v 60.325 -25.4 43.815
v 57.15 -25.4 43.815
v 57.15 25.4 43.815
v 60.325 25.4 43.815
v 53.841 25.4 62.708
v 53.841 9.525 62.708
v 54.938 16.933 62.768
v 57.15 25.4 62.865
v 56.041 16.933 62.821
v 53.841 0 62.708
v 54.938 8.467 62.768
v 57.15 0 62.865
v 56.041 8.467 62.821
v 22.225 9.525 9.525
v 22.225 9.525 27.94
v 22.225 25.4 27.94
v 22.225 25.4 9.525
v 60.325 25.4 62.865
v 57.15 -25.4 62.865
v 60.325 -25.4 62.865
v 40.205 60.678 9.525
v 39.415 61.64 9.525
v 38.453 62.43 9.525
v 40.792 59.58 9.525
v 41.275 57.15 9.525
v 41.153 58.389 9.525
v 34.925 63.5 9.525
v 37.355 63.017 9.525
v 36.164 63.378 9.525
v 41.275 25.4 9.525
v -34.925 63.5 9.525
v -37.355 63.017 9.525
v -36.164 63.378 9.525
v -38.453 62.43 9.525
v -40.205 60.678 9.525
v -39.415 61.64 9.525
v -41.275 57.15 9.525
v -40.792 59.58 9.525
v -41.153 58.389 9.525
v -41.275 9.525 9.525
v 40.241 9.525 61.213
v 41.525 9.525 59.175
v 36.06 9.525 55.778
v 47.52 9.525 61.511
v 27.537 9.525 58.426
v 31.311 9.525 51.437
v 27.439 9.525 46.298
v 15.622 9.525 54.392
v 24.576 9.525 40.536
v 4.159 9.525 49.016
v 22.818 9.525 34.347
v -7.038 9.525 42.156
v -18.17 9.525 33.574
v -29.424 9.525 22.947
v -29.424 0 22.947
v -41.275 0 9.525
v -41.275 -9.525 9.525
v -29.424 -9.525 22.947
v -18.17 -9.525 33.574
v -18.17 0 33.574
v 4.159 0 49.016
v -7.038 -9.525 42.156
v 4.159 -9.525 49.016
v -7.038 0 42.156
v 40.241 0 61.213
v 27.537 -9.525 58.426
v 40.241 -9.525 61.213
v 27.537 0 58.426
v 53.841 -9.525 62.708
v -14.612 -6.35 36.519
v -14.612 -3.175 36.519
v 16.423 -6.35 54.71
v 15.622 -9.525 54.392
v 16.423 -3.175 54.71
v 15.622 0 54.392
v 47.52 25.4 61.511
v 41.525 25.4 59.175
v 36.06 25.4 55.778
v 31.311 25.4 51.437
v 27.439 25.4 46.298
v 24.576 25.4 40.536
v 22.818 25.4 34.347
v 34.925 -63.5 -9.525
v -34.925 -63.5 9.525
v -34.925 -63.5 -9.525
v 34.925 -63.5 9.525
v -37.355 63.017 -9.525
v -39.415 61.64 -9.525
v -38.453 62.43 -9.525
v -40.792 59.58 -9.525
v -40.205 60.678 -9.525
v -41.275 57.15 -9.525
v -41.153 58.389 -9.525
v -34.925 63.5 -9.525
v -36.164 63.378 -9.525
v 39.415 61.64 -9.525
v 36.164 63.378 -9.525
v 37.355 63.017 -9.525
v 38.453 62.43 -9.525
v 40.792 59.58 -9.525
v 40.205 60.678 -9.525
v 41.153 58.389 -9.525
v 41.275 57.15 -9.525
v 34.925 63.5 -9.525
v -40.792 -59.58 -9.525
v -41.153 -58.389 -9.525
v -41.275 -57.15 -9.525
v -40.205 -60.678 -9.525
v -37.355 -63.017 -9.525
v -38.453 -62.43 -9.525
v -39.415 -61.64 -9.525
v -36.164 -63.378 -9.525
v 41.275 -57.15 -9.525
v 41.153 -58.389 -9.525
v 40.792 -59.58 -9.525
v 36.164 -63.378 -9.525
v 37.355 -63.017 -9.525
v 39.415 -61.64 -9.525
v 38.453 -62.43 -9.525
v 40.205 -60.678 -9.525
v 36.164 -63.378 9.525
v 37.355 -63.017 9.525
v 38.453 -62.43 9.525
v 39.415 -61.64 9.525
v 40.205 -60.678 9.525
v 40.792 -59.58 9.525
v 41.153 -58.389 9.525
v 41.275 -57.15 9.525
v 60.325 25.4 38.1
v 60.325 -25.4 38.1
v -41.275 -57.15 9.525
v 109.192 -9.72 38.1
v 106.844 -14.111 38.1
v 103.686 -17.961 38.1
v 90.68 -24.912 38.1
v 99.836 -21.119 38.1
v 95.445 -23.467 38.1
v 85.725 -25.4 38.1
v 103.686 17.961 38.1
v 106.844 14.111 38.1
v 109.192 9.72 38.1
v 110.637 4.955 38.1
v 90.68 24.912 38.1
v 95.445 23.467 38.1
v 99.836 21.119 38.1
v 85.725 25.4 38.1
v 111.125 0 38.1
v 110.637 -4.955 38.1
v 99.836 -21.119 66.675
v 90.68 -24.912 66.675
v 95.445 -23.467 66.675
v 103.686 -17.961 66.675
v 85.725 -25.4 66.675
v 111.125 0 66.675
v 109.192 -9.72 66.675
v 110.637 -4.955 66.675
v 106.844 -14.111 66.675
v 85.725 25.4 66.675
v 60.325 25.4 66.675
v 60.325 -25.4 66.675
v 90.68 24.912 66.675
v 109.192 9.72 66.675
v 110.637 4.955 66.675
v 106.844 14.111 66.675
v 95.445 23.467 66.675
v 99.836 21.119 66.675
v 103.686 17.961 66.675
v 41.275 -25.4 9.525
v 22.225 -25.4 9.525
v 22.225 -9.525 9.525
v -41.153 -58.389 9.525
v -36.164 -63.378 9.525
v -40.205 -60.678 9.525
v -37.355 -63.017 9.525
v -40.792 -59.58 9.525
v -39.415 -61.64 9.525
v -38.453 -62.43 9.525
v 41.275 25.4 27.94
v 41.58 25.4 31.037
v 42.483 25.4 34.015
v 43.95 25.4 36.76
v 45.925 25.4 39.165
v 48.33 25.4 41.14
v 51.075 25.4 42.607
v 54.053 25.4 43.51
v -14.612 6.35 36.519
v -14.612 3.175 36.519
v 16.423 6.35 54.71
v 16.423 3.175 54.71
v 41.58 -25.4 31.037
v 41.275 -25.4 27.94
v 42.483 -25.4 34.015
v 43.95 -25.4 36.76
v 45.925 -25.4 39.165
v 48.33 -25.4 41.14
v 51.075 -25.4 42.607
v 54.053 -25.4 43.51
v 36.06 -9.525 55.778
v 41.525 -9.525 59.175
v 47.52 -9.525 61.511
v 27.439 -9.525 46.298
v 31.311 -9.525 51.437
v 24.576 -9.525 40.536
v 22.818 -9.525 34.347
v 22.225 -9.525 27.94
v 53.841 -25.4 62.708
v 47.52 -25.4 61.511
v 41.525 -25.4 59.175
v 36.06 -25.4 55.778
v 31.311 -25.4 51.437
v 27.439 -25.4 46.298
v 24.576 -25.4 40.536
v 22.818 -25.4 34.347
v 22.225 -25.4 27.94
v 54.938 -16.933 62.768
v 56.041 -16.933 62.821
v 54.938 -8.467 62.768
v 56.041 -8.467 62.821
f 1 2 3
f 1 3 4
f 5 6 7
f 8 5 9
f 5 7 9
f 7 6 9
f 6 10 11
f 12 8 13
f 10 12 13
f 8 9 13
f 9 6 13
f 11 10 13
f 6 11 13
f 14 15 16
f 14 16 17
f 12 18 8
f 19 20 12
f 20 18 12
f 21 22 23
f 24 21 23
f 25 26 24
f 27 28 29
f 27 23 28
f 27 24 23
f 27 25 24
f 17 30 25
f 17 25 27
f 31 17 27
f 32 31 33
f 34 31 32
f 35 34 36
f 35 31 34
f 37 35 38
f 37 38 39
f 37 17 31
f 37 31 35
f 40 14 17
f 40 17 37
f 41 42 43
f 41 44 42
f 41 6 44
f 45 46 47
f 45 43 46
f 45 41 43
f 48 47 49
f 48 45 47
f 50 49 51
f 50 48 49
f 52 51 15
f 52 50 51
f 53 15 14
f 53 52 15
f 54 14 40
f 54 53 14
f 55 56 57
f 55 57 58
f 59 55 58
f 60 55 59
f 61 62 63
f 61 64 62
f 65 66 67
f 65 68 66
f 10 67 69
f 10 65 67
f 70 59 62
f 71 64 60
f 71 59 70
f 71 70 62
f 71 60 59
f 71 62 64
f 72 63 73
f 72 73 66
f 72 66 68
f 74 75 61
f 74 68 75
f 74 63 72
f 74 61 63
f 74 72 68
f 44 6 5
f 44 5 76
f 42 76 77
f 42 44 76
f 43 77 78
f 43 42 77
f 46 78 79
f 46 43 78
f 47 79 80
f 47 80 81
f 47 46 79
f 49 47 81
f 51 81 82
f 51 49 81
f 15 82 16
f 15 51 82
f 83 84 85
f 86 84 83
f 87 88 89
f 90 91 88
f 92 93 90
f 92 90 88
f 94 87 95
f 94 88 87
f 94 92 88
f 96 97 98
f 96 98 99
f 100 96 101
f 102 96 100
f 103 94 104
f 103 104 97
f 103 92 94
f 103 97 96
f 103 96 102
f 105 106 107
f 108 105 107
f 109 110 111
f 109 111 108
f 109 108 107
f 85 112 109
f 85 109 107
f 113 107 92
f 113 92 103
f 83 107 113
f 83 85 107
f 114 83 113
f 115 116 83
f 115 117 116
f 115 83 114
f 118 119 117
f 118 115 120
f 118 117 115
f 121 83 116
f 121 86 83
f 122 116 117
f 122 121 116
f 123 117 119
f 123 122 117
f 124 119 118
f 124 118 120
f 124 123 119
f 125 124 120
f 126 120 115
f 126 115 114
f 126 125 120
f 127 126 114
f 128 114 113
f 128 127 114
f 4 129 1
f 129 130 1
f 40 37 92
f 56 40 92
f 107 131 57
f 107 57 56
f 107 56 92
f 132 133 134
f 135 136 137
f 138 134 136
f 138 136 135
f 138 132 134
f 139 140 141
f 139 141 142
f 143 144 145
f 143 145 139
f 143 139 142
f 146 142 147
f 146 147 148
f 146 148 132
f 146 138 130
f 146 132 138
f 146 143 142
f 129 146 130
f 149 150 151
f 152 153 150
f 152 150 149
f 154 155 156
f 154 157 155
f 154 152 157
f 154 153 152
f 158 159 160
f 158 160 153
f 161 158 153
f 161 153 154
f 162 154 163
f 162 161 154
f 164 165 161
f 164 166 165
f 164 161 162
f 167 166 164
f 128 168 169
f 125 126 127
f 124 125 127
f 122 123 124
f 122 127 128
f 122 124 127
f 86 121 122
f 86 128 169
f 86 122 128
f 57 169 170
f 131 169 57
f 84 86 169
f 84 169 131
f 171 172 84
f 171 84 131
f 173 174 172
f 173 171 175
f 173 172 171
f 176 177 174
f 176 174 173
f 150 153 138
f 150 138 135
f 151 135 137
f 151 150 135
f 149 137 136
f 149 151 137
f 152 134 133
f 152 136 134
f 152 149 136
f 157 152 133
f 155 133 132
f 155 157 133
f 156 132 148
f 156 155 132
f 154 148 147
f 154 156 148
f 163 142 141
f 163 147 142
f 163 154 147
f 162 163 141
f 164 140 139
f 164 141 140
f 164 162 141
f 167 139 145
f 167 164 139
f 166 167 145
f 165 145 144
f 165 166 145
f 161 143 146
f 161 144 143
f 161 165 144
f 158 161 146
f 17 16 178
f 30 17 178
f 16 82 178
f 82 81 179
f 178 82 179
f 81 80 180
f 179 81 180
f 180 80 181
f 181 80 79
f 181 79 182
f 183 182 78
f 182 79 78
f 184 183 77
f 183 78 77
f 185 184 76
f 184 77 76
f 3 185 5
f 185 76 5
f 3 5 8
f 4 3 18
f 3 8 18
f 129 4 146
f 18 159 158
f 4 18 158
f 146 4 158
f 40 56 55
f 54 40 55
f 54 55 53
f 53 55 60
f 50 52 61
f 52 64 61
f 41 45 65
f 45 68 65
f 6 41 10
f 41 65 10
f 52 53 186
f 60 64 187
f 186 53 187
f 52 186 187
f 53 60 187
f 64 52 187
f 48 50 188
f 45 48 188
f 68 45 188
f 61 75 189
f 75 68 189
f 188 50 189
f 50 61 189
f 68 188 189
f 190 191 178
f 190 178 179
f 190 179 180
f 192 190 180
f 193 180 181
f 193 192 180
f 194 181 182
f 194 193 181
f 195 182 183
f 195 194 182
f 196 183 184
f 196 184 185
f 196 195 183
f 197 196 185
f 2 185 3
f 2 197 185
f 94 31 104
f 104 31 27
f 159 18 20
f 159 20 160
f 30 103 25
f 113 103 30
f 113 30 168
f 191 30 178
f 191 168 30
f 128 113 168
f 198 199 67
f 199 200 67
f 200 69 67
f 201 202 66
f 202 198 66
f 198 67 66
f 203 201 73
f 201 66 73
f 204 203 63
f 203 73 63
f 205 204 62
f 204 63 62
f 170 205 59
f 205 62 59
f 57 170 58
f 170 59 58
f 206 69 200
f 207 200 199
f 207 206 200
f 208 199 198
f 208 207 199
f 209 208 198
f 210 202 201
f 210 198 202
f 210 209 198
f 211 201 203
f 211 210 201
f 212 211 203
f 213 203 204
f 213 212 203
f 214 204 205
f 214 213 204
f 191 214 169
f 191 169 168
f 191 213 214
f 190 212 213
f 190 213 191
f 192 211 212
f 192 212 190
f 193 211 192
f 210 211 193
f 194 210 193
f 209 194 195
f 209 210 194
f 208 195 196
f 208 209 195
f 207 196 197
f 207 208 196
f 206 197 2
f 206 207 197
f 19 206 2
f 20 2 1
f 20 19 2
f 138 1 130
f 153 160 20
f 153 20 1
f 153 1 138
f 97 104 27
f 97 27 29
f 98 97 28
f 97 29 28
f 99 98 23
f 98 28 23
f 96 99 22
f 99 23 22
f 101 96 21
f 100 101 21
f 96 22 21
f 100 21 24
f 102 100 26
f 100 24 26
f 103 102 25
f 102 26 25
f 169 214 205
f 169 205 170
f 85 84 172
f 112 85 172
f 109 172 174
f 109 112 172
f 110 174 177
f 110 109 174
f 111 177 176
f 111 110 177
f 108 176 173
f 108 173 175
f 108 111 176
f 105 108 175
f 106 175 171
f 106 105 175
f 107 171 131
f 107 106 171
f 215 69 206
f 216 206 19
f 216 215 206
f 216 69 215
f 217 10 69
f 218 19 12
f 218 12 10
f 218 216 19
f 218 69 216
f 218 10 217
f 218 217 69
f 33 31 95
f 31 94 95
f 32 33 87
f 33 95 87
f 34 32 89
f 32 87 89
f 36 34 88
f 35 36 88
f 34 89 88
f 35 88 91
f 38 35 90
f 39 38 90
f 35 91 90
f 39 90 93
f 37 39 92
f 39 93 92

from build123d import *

# Parameters (mm, degrees)
F1_DEPTH = 63.5
F0_W     = 25.4
F0_H     = 5.715
F0_H_2   = 3.81
F0_H_3   = 19.05
F2_DEPTH = 25.4
F3_DEPTH = 9.525
F5_R     = 6.35


with BuildPart() as f1:
    # F0 (on Front) → F1 (new body, symmetric)
    with BuildSketch(Plane.XZ):
        Polygon((22.225, 9.525), (-41.275, 9.525), (-41.275, -9.525), (41.275, -9.525), (41.275, 9.525), align=None)
    extrude(amount=F1_DEPTH, both=True)

    # F0 (on Front) → F2 (join, symmetric)
    with BuildSketch(Plane.XZ):
        with BuildLine():
            Line((22.225, 27.94), (22.225, 9.525))
            Line((22.225, 9.525), (41.275, 9.525))
            Line((41.275, 9.525), (41.275, 27.94))
            ThreePointArc((41.275, 27.94), (45.9246798487, 39.1653201513), (57.15, 43.815))
            Line((57.15, 43.815), (60.325, 43.815))
            Line((60.325, 43.815), (60.325, 62.865))
            Line((60.325, 62.865), (57.15, 62.865))
            add(Edge.make_bspline(
                [(53.8414351699, 62.7079309676), (54.9353913903, 62.7725296007), (56.0381901925, 62.8249247758), (57.15, 62.865)],
                knots=[109.0590899765, 109.0590899765, 109.0590899765, 109.0590899765, 111.9492573669, 111.9492573669, 111.9492573669, 111.9492573669], degree=3))
            ThreePointArc((53.8414351699, 62.7079309676), (31.3110057114, 51.4368508348), (22.225, 27.94))
        make_face()
        with Locations((73.025, 40.9575)):
            Rectangle(F0_W, F0_H)
        with Locations((73.025, 64.77)):
            Rectangle(F0_W, F0_H_2)
        with Locations((73.025, 53.34)):
            Rectangle(F0_W, F0_H_3)
    extrude(amount=F2_DEPTH, both=True)

    # F0 (on Front) → F3 (join, symmetric)
    with BuildSketch(Plane.XZ):
        with BuildLine():
            add(Edge.make_bspline(
                [(-41.275, 9.525), (-16.1274971076, 40.4562996606), (12.5615182112, 60.2703323134), (53.8414351699, 62.7079309676)],
                knots=[0, 0, 0, 0, 109.0590899765, 109.0590899765, 109.0590899765, 109.0590899765], degree=3))
            Line((-41.275, 9.525), (22.225, 9.525))
            Line((22.225, 9.525), (22.225, 27.94))
            ThreePointArc((22.225, 27.94), (31.3110057114, 51.4368508348), (53.8414351699, 62.7079309676))
        make_face()
    extrude(amount=F3_DEPTH, both=True)

    # F0 (on Front) → F4 (revolve)
    with BuildSketch(Plane.XZ):
        Polygon((85.725, 66.675), (85.725, 62.865), (85.725, 43.815), (85.725, 38.1), (111.125, 38.1), (111.125, 66.675), align=None)
    revolve(axis=Axis((85.725, 0, 52.3875), (0, 0, 1)))

    # F5
    f5_edges = [f1.edges().sort_by_distance(p)[0] for p in [
        (-41.275, 63.5, 0),
        (41.275, 63.5, 0),
        (41.275, -63.5, 0),
        (-41.275, -63.5, 0),
    ]]
    fillet(f5_edges, radius=F5_R)


solid = f1.part
